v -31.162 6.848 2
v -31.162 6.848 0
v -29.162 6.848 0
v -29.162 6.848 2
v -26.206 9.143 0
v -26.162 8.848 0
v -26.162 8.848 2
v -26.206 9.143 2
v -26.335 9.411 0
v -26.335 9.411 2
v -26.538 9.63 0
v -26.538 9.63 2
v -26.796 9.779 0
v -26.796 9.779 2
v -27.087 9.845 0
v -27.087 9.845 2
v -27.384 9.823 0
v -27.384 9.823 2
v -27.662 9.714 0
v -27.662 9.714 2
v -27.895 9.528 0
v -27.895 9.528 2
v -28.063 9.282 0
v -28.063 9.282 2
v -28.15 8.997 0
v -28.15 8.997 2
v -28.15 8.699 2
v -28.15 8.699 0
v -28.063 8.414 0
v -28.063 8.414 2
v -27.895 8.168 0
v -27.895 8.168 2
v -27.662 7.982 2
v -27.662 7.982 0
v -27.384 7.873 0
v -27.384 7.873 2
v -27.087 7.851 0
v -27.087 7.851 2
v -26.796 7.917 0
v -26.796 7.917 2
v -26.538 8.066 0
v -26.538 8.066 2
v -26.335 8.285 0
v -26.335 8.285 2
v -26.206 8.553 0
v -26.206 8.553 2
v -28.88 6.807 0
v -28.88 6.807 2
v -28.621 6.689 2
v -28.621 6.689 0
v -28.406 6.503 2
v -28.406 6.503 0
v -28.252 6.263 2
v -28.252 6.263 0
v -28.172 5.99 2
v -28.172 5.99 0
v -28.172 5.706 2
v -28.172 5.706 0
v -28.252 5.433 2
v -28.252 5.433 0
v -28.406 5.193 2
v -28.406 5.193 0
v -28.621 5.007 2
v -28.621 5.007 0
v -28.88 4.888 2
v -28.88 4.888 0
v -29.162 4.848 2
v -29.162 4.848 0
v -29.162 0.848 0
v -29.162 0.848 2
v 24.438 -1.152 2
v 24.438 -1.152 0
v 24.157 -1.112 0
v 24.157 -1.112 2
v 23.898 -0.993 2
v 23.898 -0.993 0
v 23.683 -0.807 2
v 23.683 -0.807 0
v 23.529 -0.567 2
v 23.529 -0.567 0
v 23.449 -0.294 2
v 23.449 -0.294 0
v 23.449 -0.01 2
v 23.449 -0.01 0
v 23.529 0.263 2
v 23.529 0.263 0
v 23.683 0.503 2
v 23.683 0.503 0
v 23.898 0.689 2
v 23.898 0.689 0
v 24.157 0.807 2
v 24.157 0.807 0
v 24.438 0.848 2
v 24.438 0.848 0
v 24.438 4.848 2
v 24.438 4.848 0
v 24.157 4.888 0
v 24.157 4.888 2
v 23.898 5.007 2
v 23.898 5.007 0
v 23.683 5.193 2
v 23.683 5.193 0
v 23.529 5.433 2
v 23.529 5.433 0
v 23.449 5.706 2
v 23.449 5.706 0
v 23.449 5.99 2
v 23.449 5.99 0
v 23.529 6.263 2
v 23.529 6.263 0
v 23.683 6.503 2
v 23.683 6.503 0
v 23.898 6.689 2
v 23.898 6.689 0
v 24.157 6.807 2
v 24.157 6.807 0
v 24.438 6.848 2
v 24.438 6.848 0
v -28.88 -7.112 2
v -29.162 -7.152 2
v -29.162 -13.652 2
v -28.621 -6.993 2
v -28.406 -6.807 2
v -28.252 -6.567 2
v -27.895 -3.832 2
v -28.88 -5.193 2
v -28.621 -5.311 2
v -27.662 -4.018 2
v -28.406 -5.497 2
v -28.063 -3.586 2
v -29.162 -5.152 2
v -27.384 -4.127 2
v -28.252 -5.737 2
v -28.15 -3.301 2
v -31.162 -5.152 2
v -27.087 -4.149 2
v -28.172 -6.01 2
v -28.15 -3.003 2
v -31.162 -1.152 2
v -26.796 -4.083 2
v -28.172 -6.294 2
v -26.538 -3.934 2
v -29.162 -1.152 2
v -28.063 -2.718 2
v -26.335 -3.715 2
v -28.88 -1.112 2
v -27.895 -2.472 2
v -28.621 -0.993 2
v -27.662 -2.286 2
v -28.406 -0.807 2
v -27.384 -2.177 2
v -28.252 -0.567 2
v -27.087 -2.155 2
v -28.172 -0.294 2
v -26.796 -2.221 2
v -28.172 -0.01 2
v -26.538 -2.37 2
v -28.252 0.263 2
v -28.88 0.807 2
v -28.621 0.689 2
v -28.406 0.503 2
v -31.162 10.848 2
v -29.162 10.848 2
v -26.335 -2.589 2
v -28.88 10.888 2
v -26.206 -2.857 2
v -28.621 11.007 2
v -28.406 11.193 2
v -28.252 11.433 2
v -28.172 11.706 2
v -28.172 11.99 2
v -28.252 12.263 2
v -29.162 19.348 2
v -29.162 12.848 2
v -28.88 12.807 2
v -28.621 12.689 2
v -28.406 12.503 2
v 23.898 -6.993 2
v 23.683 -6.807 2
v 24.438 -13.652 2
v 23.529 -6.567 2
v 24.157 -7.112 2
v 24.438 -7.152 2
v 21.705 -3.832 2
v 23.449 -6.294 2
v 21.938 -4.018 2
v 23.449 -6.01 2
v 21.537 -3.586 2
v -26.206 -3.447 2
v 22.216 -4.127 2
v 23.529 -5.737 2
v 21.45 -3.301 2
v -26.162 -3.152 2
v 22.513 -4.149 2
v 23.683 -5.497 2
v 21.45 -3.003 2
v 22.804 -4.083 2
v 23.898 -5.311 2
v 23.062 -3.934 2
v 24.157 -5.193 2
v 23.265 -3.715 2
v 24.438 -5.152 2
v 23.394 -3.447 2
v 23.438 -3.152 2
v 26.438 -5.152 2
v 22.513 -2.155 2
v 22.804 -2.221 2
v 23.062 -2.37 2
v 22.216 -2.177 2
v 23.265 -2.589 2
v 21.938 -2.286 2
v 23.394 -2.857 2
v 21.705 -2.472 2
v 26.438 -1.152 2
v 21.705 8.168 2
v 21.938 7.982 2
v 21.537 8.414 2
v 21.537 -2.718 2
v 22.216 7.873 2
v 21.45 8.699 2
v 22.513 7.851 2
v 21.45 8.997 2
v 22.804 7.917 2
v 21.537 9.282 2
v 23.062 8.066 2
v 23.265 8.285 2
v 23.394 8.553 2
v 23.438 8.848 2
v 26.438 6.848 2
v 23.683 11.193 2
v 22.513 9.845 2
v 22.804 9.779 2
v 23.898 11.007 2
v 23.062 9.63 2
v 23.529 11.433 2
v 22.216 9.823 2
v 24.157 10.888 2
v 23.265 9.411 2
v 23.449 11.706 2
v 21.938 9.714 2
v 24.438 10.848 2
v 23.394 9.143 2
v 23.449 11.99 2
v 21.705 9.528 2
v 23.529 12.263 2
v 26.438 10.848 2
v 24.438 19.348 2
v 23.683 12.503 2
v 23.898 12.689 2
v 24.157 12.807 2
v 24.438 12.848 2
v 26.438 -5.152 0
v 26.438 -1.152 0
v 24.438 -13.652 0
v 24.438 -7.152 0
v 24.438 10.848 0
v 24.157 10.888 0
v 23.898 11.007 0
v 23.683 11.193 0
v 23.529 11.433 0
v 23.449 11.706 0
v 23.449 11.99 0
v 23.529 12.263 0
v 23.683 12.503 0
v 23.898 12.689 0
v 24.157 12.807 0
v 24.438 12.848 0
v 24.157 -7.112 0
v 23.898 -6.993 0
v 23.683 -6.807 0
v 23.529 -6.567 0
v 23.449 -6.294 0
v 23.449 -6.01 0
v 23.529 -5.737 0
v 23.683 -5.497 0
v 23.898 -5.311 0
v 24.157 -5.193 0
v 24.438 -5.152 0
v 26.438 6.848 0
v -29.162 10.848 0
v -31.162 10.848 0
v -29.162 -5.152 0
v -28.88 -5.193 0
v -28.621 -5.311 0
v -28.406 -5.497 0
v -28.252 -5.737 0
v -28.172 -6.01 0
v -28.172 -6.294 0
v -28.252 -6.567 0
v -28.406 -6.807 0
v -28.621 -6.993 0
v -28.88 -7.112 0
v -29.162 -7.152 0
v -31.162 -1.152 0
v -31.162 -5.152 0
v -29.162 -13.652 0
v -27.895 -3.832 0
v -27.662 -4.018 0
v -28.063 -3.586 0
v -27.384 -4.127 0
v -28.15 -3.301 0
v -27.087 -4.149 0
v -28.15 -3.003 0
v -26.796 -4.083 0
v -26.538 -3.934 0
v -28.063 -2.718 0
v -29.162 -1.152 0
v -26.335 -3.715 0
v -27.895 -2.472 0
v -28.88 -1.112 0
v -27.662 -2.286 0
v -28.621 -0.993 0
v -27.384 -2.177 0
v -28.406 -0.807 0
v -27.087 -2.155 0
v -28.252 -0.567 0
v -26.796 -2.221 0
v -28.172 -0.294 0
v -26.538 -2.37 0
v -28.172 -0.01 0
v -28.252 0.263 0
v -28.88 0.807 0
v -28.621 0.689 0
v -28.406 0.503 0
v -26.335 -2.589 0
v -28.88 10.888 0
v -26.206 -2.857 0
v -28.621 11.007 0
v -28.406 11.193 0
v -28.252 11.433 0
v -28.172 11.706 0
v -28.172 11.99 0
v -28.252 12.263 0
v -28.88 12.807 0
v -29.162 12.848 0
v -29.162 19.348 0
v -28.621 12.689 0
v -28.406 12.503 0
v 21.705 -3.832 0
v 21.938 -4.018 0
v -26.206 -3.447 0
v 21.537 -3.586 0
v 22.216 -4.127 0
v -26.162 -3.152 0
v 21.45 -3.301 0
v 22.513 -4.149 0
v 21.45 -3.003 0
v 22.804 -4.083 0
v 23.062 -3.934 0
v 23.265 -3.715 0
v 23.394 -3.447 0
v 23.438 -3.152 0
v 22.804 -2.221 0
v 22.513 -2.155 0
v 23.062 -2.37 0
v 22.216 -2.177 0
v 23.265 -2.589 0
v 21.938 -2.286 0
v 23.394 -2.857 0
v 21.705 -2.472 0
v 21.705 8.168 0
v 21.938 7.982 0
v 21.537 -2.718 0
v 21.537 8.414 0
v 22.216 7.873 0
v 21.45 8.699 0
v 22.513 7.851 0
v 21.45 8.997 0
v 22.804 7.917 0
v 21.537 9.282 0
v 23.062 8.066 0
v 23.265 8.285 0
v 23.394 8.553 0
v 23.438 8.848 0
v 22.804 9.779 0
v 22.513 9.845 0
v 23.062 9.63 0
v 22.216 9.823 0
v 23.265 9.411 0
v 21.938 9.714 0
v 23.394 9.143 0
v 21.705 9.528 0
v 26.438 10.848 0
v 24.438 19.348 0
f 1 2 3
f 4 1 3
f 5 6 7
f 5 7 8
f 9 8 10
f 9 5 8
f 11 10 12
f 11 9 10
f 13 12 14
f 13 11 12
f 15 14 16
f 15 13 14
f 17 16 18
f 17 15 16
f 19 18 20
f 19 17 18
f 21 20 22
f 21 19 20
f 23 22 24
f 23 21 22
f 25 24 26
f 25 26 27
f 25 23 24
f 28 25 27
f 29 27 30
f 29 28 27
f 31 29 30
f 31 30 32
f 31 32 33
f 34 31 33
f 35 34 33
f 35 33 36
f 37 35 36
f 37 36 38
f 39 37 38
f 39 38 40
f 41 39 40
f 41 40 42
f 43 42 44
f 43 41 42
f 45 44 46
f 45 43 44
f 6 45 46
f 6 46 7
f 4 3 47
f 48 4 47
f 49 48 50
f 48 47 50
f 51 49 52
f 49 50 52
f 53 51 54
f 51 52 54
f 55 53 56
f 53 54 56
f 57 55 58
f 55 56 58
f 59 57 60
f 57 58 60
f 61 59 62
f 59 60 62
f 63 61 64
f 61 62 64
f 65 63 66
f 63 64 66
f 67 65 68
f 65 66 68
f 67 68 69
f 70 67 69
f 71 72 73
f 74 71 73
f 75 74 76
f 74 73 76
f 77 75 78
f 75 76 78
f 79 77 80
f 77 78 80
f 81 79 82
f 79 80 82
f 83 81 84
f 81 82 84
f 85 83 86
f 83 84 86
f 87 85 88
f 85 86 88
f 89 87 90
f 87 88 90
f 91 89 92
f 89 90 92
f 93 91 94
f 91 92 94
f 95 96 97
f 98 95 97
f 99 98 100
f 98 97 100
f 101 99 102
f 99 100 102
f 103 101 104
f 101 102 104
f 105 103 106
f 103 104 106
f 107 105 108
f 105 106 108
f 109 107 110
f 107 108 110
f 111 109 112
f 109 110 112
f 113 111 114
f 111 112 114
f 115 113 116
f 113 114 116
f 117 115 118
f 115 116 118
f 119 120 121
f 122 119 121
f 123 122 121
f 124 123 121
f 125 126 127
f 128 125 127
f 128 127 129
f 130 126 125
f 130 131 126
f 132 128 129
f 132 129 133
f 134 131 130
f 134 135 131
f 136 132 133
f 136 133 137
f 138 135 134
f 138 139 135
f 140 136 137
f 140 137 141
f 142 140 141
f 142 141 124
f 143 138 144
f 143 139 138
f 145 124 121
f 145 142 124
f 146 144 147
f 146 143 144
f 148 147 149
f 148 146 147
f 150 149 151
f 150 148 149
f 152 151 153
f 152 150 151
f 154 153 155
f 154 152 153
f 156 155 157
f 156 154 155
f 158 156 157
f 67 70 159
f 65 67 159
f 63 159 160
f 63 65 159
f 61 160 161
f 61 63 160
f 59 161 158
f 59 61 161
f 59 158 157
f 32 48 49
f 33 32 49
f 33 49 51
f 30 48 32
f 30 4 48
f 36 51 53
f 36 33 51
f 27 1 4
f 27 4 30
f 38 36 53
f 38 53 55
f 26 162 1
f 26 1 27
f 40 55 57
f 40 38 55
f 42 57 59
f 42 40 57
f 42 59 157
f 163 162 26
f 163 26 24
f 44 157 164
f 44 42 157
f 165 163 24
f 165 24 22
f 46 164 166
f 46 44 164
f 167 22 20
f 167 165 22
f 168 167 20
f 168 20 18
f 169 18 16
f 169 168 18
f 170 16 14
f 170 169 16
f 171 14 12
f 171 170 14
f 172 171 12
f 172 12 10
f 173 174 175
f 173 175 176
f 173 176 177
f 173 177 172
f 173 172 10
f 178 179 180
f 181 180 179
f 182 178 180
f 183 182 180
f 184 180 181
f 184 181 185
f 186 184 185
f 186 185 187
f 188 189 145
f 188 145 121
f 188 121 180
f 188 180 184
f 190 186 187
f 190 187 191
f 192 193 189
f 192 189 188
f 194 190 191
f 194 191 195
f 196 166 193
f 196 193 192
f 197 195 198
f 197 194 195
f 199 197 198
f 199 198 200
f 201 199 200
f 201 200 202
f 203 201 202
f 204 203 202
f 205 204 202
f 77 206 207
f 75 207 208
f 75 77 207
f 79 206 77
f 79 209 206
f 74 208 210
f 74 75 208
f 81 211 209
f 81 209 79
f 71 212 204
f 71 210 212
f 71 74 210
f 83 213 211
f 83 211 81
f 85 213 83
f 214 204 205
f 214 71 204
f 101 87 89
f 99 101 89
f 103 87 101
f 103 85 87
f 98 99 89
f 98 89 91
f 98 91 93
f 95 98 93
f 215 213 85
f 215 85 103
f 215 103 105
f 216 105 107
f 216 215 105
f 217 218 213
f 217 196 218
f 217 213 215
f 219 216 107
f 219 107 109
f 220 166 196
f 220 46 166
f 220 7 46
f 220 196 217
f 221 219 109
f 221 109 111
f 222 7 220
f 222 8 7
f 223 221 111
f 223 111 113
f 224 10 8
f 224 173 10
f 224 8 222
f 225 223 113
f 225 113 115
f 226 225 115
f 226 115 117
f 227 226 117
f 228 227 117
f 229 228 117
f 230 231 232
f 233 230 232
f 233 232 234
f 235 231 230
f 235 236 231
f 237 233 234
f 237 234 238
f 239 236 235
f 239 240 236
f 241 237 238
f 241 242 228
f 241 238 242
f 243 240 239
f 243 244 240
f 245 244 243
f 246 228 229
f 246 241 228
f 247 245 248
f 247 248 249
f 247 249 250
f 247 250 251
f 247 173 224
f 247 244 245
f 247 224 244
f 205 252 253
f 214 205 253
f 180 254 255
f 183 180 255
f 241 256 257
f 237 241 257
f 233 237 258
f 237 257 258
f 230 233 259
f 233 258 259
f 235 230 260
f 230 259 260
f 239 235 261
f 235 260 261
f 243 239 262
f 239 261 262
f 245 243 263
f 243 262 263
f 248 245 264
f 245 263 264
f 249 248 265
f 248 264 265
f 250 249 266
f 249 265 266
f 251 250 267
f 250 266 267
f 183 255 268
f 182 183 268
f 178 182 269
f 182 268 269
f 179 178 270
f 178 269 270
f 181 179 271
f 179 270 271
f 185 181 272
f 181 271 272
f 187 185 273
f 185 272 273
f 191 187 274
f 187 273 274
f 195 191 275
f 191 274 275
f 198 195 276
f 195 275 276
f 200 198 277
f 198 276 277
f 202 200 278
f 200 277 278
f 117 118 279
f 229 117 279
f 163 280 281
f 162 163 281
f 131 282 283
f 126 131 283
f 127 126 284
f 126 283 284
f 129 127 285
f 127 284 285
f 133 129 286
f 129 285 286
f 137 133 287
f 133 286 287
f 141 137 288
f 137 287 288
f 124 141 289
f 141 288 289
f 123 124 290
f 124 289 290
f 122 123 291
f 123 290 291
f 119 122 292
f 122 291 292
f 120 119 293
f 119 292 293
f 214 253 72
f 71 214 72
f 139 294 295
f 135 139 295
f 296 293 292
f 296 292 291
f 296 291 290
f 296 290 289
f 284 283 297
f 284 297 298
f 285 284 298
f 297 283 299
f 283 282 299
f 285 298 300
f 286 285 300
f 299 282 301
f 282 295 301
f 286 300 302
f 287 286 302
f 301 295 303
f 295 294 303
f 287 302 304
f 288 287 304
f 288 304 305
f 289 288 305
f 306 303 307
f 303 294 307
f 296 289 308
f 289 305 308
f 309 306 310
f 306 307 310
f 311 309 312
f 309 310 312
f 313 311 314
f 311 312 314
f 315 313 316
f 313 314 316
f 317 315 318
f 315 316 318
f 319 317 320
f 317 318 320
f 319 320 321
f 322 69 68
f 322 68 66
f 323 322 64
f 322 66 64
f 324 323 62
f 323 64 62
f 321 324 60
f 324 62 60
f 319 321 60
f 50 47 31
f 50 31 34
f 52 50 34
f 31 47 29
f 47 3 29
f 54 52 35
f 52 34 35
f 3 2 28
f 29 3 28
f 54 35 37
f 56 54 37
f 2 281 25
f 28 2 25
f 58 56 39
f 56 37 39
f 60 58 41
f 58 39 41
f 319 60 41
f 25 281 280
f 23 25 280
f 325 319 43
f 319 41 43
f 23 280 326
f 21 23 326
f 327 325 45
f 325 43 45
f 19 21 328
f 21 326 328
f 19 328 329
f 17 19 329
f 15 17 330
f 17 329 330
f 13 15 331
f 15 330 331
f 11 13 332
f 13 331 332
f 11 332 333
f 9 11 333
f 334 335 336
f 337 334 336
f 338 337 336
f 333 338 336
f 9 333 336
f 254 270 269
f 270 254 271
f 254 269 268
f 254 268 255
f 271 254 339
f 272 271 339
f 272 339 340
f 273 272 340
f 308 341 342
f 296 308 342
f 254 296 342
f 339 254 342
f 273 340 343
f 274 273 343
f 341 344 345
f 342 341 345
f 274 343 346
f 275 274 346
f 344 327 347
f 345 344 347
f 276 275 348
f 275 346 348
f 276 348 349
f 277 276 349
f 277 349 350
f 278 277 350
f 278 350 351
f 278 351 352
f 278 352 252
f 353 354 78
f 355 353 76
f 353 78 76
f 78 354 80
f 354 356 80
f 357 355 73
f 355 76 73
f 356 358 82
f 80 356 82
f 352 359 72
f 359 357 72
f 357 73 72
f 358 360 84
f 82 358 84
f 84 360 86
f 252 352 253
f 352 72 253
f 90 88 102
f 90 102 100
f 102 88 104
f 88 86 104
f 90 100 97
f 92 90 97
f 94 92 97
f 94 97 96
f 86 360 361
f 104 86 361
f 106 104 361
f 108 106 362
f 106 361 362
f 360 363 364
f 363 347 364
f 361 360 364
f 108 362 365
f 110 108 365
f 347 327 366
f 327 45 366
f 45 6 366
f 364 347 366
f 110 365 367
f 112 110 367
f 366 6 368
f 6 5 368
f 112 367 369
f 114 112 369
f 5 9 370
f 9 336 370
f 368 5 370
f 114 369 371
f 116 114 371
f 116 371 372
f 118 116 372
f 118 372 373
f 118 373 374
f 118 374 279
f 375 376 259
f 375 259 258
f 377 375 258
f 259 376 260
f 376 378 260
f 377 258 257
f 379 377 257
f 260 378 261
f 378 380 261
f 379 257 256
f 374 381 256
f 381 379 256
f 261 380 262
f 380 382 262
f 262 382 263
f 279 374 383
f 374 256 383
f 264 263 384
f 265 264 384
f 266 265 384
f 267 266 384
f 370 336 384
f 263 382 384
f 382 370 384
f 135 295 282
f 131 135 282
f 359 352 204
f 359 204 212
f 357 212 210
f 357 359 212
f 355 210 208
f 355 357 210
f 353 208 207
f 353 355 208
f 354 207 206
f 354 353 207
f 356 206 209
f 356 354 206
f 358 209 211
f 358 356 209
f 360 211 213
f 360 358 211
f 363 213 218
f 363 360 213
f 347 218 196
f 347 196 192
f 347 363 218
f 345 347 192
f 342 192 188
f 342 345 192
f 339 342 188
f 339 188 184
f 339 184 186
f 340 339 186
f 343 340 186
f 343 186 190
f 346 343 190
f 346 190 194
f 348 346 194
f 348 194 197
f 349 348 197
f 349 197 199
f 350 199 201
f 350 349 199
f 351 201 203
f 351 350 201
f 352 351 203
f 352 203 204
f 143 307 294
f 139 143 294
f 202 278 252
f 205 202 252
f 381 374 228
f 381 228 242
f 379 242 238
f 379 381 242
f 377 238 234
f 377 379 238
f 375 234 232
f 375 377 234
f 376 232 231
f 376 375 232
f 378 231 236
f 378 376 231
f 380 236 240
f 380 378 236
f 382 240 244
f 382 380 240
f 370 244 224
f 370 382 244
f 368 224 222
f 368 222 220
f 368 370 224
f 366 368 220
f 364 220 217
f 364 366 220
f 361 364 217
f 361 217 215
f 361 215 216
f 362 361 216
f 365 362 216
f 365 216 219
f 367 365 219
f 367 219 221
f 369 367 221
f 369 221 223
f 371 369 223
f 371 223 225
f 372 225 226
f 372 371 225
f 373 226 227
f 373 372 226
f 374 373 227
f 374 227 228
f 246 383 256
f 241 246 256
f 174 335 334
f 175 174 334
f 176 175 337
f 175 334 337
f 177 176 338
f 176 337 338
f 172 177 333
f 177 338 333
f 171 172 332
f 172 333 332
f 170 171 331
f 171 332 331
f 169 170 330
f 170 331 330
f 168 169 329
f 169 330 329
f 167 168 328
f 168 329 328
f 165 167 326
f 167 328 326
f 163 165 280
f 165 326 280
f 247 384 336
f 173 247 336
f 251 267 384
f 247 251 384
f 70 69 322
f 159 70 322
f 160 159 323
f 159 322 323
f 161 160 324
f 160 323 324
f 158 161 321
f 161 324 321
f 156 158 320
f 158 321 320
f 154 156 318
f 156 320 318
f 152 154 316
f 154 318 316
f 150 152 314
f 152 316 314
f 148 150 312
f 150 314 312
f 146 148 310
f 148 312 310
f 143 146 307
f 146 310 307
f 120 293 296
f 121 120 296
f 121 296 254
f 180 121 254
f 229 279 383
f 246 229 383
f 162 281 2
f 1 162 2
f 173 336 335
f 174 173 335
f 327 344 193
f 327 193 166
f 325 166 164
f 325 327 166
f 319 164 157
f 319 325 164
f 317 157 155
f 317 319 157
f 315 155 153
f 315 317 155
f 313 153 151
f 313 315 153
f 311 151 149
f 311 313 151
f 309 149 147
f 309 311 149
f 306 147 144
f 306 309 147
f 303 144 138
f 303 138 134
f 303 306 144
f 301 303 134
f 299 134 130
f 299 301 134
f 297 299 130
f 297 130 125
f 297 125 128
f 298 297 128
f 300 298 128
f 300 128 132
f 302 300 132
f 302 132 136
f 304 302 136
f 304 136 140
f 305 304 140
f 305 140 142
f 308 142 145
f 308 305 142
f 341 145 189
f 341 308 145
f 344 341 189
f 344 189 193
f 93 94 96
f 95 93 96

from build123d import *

# Parameters (mm, degrees)
SKETCH_1_R      = 1
EXTRUDE_1_DEPTH = 2


with BuildPart() as part:
    # 草圖1 → 填料-伸長1 (new body)
    with BuildSketch(Plane.XY):
        with BuildLine():
            Line((-28.161562759, 19.347959184), (-29.161562759, 19.347959184))
            Line((-29.161562759, 19.347959184), (-29.161562759, 18.347959184))
            Line((-29.161562759, 18.347959184), (-29.161562759, 12.847959184))
            ThreePointArc((-29.161562759, 12.847959184), (-28.161562759, 11.847959184), (-29.161562759, 10.847959184))
            Line((-29.161562759, 10.847959184), (-31.161562759, 10.847959184))
            Line((-31.161562759, 10.847959184), (-31.161562759, 6.847959184))
            Line((-31.161562759, 6.847959184), (-29.161562759, 6.847959184))
            ThreePointArc((-29.161562759, 6.847959184), (-28.161562759, 5.847959184), (-29.161562759, 4.847959184))
            Line((-29.161562759, 4.847959184), (-29.161562759, 0.847959184))
            ThreePointArc((-29.161562759, 0.847959184), (-28.161562759, -0.152040816), (-29.161562759, -1.152040816))
            Line((-29.161562759, -1.152040816), (-31.161562759, -1.152040816))
            Line((-31.161562759, -1.152040816), (-31.161562759, -5.152040816))
            Line((-31.161562759, -5.152040816), (-29.161562759, -5.152040816))
            ThreePointArc((-29.161562759, -5.152040816), (-28.161562759, -6.152040816), (-29.161562759, -7.152040816))
            Line((-29.161562759, -7.152040816), (-29.161562759, -12.652040816))
            Line((-29.161562759, -12.652040816), (-29.161562759, -13.652040816))
            Line((-29.161562759, -13.652040816), (-28.161562759, -13.652040816))
            Line((-28.161562759, -13.652040816), (23.438437241, -13.652040816))
            Line((23.438437241, -13.652040816), (24.438437241, -13.652040816))
            Line((24.438437241, -13.652040816), (24.438437241, -12.652040816))
            Line((24.438437241, -12.652040816), (24.438437241, -7.152040816))
            ThreePointArc((24.438437241, -7.152040816), (23.438437241, -6.152040816), (24.438437241, -5.152040816))
            Line((24.438437241, -5.152040816), (26.438437241, -5.152040816))
            Line((26.438437241, -5.152040816), (26.438437241, -1.152040816))
            Line((26.438437241, -1.152040816), (24.438437241, -1.152040816))
            ThreePointArc((24.438437241, -1.152040816), (23.438437241, -0.152040816), (24.438437241, 0.847959184))
            Line((24.438437241, 0.847959184), (24.438437241, 4.847959184))
            ThreePointArc((24.438437241, 4.847959184), (23.438437241, 5.847959184), (24.438437241, 6.847959184))
            Line((24.438437241, 6.847959184), (26.438437241, 6.847959184))
            Line((26.438437241, 6.847959184), (26.438437241, 10.847959184))
            Line((26.438437241, 10.847959184), (24.438437241, 10.847959184))
            ThreePointArc((24.438437241, 10.847959184), (23.438437241, 11.847959184), (24.438437241, 12.847959184))
            Line((24.438437241, 12.847959184), (24.438437241, 18.347959184))
            Line((24.438437241, 18.347959184), (24.438437241, 19.347959184))
            Line((24.438437241, 19.347959184), (23.438437241, 19.347959184))
            Line((23.438437241, 19.347959184), (-28.161562759, 19.347959184))
        make_face()
        with Locations((22.438437241, 8.847959184)):
            Circle(SKETCH_1_R, mode=Mode.SUBTRACT)
        with Locations((-27.161562759, 8.847959184)):
            Circle(SKETCH_1_R, mode=Mode.SUBTRACT)
        with Locations((-27.161562759, -3.152040816)):
            Circle(SKETCH_1_R, mode=Mode.SUBTRACT)
        with Locations((22.438437241, -3.152040816)):
            Circle(SKETCH_1_R, mode=Mode.SUBTRACT)
    extrude(amount=EXTRUDE_1_DEPTH)


solid = part.part
